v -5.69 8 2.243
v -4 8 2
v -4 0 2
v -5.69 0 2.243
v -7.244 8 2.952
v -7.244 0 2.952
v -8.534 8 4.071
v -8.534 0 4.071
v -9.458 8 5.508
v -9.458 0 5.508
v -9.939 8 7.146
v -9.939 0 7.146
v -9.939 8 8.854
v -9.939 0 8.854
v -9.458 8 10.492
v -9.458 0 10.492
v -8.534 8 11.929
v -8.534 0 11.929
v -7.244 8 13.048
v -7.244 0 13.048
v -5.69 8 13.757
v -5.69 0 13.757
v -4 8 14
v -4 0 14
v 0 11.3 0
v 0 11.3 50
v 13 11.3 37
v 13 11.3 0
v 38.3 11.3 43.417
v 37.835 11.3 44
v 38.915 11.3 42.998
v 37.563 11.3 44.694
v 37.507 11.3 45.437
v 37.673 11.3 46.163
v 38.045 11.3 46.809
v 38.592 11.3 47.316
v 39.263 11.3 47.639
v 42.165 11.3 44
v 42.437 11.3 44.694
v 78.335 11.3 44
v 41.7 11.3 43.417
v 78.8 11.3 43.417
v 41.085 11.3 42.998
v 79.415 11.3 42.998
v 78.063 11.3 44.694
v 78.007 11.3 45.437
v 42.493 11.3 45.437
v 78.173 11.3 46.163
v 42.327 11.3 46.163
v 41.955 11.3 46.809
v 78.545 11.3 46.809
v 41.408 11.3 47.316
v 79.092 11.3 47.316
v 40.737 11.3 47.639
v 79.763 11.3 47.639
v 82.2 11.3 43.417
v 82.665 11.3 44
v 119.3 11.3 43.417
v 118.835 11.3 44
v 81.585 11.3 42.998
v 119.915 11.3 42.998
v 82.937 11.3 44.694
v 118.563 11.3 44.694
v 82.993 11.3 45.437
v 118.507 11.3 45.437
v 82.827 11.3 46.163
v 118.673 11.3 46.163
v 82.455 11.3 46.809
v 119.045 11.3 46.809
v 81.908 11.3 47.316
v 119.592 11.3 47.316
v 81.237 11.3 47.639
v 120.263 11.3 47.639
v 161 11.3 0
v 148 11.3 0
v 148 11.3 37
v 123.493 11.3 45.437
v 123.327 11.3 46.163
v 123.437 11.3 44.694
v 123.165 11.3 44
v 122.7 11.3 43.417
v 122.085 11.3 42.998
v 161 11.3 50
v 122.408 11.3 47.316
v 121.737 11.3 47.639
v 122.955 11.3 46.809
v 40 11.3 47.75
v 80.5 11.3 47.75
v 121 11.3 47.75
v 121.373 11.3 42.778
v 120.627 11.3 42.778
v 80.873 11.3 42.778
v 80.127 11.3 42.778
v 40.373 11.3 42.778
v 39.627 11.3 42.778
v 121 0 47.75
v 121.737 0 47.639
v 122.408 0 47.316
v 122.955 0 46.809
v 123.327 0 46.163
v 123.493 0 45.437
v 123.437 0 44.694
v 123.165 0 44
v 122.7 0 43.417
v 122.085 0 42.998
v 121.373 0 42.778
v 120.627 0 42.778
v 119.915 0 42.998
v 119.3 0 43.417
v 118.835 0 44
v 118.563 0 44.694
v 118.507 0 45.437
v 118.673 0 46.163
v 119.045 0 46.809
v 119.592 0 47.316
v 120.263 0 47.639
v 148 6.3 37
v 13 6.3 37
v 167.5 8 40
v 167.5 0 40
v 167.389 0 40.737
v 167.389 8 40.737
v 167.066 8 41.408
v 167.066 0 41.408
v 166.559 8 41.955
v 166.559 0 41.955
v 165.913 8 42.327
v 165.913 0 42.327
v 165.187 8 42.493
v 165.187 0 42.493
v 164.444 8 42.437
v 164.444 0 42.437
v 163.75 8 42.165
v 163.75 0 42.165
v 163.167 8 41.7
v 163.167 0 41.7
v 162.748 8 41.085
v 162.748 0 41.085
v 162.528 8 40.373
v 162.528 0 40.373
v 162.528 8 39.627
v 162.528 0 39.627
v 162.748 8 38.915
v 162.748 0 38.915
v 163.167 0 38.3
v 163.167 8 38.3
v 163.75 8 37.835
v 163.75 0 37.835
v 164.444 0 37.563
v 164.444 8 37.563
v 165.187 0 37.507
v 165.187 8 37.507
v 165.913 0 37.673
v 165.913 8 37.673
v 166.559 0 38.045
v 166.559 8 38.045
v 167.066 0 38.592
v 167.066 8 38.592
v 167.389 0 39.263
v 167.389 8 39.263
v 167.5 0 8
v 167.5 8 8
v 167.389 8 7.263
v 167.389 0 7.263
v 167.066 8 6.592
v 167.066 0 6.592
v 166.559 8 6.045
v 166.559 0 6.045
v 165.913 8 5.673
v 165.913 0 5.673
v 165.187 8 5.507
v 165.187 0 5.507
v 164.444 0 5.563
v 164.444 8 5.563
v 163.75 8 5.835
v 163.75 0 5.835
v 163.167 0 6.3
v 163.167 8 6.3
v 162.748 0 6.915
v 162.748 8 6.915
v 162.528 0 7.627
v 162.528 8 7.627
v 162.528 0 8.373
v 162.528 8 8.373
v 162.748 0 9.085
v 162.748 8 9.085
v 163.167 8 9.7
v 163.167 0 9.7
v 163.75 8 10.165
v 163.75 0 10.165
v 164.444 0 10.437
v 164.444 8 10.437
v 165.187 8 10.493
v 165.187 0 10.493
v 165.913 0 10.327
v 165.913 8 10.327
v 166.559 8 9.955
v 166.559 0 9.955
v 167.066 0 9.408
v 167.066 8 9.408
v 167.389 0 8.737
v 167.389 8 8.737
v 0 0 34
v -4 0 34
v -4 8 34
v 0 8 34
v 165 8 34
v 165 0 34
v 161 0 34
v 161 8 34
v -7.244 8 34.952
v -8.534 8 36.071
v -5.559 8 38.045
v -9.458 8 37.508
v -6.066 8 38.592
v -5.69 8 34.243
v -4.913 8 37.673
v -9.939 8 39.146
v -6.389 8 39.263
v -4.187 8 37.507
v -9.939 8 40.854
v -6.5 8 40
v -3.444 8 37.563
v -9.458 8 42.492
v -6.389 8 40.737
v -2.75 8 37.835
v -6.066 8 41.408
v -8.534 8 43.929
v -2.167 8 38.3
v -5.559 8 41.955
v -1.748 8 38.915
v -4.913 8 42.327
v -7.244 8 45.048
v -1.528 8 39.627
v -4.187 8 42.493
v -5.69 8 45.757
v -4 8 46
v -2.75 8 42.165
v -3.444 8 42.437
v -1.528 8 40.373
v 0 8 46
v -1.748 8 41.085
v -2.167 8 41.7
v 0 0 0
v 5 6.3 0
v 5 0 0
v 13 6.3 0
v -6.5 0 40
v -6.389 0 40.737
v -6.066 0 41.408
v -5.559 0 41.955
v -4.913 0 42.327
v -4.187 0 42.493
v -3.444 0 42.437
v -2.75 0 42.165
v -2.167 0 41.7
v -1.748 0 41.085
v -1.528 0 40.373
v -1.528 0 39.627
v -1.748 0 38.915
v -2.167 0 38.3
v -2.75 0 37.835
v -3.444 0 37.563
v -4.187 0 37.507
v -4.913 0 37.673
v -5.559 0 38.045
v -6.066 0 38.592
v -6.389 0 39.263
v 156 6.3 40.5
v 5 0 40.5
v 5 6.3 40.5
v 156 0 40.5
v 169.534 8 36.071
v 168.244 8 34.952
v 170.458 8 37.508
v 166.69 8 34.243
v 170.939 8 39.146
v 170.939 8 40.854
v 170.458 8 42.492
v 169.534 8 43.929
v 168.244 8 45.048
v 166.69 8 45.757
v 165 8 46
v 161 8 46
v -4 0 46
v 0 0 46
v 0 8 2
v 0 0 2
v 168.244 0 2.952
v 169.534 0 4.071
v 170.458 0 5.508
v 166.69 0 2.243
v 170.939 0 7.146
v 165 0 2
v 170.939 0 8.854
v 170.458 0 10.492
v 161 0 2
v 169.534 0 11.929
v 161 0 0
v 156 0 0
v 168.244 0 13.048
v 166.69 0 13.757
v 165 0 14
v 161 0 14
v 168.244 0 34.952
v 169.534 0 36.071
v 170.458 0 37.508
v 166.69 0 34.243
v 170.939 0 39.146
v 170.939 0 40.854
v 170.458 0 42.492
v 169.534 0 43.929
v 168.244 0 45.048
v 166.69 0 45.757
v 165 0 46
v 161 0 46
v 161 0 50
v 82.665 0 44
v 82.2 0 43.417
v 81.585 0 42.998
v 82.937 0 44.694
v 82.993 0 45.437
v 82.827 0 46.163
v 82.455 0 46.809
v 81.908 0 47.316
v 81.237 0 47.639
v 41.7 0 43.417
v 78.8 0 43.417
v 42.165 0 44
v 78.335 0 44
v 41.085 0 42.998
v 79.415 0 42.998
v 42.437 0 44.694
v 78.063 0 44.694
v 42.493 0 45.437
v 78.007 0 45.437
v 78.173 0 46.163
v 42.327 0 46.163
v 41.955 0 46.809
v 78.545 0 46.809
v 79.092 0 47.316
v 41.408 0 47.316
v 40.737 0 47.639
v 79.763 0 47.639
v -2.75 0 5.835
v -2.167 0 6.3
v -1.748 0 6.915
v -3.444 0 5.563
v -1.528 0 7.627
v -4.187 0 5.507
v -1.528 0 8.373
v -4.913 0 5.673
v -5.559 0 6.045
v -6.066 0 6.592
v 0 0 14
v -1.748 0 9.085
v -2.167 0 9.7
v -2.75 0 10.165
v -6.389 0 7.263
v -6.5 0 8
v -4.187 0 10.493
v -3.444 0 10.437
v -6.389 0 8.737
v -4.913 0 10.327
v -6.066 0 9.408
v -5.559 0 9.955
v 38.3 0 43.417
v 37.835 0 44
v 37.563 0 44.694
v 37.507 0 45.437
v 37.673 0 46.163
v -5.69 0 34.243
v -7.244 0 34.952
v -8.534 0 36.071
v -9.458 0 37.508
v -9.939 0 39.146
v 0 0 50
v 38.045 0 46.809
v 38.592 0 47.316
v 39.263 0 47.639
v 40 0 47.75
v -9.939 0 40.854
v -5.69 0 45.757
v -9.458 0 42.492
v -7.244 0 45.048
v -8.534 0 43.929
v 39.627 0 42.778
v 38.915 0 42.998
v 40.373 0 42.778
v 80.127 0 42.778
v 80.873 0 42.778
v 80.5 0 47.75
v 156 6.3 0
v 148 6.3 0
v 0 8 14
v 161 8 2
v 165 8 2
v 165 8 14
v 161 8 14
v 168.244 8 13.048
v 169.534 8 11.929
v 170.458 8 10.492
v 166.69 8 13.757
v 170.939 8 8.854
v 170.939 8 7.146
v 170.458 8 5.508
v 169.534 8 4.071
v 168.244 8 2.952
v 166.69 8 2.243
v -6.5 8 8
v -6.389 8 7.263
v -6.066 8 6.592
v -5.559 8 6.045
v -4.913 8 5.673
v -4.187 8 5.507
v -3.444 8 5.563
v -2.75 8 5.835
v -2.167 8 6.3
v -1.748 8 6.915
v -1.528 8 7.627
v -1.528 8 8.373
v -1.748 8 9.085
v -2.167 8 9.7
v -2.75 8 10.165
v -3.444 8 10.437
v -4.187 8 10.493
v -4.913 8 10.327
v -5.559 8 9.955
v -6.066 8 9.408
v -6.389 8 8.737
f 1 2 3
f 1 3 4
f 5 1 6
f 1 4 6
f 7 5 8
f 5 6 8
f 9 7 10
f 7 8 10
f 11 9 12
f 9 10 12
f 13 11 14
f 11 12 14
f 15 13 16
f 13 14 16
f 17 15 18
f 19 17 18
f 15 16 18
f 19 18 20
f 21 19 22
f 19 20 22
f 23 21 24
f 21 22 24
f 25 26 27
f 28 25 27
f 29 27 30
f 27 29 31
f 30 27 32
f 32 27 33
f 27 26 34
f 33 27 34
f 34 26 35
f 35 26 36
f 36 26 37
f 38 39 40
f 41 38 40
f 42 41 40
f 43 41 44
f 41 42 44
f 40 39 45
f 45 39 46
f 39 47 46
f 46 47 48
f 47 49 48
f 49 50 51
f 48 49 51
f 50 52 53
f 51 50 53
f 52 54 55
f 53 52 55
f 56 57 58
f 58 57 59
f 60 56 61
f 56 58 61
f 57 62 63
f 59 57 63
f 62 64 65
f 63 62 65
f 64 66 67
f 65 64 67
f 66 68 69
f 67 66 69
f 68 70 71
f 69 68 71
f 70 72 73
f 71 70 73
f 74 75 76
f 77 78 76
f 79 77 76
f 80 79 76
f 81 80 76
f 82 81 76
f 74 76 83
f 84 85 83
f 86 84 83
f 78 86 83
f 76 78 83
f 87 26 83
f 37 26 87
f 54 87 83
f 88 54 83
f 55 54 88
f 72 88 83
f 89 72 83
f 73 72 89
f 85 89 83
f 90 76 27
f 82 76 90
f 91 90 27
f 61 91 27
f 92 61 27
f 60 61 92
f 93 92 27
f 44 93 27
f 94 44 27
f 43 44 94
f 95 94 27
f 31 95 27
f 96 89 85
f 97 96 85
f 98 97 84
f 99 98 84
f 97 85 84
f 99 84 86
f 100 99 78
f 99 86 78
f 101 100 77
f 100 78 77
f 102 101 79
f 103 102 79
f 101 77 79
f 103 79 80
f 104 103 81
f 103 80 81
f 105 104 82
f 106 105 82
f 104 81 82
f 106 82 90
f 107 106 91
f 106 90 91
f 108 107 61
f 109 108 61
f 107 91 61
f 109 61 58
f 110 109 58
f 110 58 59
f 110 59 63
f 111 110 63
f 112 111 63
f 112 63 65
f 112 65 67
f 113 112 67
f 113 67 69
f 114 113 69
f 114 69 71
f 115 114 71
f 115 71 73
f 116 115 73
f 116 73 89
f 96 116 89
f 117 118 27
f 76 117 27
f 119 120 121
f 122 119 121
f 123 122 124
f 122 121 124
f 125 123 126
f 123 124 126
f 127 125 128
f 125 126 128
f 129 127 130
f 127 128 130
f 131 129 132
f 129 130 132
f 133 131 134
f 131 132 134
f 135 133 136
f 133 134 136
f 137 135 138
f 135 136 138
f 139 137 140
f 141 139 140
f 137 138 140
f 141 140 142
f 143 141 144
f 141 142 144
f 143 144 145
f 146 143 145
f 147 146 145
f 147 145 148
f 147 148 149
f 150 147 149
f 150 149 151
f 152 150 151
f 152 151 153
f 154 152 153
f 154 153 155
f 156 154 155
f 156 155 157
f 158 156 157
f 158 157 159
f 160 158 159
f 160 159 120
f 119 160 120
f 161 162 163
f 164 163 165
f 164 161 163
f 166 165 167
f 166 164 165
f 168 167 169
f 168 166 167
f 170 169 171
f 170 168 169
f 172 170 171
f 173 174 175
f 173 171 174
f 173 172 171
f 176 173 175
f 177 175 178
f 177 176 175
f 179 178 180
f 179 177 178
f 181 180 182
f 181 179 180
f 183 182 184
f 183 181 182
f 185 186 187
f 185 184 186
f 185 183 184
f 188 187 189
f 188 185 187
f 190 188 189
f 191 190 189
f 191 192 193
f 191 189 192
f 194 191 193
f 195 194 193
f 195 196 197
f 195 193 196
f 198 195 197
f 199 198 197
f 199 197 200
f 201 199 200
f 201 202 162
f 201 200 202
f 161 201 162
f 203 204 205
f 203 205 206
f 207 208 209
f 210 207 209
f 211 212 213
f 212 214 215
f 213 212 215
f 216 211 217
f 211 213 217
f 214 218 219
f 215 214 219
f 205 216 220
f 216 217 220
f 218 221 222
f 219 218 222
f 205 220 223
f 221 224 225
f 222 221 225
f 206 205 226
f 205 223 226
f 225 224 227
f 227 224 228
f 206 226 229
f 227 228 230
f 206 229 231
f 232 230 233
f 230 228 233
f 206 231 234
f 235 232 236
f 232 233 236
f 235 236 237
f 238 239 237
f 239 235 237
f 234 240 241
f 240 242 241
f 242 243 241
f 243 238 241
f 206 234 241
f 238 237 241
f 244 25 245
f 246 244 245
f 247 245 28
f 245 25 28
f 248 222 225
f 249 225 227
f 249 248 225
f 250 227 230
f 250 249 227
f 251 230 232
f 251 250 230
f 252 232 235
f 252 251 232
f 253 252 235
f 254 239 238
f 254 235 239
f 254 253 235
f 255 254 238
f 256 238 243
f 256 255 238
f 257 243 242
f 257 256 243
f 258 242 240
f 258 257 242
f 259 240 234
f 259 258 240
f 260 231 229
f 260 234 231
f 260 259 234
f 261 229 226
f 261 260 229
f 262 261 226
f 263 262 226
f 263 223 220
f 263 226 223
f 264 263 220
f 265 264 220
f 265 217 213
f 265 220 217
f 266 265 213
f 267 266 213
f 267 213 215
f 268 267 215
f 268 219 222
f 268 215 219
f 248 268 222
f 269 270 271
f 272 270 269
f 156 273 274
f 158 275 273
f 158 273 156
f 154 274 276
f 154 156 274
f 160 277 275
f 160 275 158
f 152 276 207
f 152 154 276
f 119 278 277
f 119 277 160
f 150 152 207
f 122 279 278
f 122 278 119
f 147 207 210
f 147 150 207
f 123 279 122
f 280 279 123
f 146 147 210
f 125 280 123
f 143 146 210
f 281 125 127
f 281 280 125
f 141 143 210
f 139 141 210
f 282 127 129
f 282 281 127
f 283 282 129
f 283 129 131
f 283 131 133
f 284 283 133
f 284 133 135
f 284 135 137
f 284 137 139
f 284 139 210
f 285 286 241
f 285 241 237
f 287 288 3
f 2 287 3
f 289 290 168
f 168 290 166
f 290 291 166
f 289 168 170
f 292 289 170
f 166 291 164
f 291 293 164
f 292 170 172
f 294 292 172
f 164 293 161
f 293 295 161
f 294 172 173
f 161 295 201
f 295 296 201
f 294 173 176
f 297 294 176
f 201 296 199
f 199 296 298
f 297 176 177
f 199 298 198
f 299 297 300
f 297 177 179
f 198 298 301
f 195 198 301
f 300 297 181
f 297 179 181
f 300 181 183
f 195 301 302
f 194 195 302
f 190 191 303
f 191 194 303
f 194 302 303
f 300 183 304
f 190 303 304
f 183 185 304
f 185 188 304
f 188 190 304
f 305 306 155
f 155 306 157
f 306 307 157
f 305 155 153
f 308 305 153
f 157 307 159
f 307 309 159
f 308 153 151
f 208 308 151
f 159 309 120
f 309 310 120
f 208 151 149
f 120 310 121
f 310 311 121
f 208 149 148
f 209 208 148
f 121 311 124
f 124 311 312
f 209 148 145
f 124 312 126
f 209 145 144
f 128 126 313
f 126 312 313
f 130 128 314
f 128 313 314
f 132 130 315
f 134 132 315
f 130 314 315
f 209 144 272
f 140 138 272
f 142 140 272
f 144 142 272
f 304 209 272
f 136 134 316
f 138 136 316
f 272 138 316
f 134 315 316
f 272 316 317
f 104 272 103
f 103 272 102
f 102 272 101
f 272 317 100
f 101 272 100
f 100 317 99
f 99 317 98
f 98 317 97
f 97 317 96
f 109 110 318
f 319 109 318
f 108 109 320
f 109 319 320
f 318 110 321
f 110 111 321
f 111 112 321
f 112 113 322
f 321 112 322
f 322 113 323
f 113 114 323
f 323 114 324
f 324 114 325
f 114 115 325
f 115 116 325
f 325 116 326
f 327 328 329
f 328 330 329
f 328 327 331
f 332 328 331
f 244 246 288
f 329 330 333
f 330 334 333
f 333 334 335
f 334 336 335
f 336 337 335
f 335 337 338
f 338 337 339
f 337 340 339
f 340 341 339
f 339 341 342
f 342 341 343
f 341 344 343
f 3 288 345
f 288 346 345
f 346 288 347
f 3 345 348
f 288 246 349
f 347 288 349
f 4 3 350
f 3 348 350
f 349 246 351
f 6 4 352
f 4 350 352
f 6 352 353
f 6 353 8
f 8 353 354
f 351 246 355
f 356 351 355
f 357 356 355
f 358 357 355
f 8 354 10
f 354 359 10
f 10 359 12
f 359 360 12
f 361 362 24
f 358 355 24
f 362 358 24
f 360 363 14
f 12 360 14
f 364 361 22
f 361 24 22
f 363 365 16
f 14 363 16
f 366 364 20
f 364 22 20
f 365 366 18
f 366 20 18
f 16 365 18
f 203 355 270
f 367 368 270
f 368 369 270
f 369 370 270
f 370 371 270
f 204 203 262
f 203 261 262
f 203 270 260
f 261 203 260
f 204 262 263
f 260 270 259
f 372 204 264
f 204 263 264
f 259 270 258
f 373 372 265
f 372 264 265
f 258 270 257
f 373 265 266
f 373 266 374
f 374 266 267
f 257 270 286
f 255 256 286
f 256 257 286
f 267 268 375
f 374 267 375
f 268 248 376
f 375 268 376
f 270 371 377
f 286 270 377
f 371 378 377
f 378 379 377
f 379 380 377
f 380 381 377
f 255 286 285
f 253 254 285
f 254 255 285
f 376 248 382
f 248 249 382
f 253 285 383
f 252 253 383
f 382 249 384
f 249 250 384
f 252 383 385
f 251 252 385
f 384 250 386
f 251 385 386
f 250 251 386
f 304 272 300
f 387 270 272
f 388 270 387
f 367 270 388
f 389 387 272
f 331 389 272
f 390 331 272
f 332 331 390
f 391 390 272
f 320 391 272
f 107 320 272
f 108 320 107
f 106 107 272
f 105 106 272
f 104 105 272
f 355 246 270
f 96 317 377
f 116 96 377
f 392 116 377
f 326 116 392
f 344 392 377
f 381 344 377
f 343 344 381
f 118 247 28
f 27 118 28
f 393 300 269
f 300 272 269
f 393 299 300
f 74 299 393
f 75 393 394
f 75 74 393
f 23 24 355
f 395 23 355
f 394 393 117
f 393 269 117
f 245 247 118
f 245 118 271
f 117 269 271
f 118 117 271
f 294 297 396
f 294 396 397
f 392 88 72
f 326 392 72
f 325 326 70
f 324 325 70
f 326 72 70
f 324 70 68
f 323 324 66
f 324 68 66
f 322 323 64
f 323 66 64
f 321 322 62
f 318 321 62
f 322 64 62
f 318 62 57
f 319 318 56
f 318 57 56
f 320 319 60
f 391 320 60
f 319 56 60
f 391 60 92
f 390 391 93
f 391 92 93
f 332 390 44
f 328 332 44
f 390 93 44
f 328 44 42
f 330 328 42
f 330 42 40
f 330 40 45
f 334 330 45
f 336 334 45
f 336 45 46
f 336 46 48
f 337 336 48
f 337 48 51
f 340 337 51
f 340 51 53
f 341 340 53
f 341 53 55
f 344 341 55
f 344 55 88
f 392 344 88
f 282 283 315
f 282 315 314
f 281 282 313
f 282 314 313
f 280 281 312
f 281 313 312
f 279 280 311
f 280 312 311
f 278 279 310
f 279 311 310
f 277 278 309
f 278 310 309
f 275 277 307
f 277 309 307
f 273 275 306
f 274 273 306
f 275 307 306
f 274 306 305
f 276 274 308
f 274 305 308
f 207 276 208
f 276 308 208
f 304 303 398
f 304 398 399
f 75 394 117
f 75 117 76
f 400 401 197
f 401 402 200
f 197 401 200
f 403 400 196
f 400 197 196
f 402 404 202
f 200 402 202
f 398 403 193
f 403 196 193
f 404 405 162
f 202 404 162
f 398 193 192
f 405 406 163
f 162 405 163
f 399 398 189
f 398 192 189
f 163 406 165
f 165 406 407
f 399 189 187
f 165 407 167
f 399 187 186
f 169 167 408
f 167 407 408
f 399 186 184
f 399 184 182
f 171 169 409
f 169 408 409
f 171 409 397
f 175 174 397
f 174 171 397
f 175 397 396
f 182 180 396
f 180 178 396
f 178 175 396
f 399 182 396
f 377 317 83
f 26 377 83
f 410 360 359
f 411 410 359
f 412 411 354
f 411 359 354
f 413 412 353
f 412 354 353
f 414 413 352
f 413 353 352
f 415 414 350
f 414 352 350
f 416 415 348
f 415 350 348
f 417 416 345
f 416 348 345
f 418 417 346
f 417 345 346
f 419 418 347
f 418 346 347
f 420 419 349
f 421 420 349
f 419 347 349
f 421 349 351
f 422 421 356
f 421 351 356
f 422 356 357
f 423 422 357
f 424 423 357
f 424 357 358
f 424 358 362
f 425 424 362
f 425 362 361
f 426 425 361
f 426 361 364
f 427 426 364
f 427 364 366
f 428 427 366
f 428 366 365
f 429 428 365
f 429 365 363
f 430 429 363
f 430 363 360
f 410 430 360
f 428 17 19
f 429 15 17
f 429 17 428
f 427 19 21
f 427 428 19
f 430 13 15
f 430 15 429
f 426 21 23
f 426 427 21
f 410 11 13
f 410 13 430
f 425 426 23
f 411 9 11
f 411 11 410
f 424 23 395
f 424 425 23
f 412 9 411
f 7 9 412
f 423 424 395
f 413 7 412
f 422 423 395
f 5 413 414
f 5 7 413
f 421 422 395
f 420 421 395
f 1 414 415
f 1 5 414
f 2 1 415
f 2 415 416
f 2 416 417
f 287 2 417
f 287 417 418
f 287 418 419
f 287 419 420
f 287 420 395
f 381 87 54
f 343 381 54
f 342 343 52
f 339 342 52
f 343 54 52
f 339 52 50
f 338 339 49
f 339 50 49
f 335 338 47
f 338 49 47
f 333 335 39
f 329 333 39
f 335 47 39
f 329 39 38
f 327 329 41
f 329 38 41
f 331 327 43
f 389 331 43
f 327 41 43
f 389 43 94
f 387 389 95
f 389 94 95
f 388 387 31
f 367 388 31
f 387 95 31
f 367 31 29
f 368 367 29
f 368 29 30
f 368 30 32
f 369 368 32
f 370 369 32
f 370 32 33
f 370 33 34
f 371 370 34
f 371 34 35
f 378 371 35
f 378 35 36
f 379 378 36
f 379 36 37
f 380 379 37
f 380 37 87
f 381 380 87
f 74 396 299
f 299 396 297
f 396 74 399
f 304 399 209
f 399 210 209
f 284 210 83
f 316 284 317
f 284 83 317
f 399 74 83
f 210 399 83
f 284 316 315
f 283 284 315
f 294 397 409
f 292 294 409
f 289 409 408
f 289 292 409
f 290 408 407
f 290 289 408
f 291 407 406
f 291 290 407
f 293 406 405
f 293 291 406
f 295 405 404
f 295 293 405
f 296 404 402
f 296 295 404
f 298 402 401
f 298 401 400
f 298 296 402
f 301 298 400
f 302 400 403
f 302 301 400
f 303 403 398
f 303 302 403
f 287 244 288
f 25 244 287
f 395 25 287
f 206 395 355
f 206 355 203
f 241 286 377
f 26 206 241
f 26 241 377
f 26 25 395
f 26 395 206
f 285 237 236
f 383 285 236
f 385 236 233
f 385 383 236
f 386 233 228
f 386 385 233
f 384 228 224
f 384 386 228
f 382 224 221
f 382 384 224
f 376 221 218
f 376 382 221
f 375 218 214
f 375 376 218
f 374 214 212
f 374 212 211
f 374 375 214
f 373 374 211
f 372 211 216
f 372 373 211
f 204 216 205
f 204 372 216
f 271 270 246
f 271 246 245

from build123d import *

# Parameters (mm, degrees)
CROQUIS4_W                = 13
CROQUIS4_H                = 11.3
SALIENTE_EXTRUIR1_DEPTH   = 161
CROQUIS5_W                = 151
CROQUIS5_H                = 3.5
CORTAR_EXTRUIR1_DEPTH     = 6.3
SALIENTE_EXTRUIR3_DEPTH   = 8
CROQUIS9_R                = 2.5
CORTAR_EXTRUIR3_DEPTH     = 179.518038304
SIMETR_A8_COPY_1_DEPTH    = 8
SIMETR_A8_COPY_2_SKETCH_R = 2.5
SIMETR_A8_COPY_2_DEPTH    = 179.518038304
CROQUIS10_R               = 2.5
CORTAR_EXTRUIR4_DEPTH     = 179.518038304
MATRIZL1_COUNT            = 3
MATRIZL1_PITCH            = 40.5


with BuildPart() as part:
    # Barrer1: sweep along a path in Croquis3
    with BuildLine(Plane(origin=(0, 0, 0), x_dir=(1, 0, 0), z_dir=(0, 1, 0))) as barrer1_path:
        Line((0, 0), (0, -37))
    # Croquis1 → Barrer1 (sweep)
    with BuildSketch(Plane.XY):
        Polygon((0, 0), (0, 11.3), (13, 11.3), (13, 6.3), (5, 6.3), (5, 0), align=None)
    barrer1 = sweep(path=barrer1_path.line)

    # Croquis4 → Saliente-Extruir1 (add)
    with BuildSketch(Plane.ZY):
        with Locations((43.5, 5.65)):
            Rectangle(CROQUIS4_W, CROQUIS4_H)
    extrude(amount=-SALIENTE_EXTRUIR1_DEPTH)

    # Simetría5: Barrer1 across plane
    add(barrer1.mirror(Plane.ZY.offset(-80.5)))

    # Croquis5 → Cortar-Extruir1 (cut)
    with BuildSketch(Plane.XZ):
        with Locations((80.5, 38.75)):
            Rectangle(CROQUIS5_W, CROQUIS5_H)
    extrude(amount=-CORTAR_EXTRUIR1_DEPTH, mode=Mode.SUBTRACT)

    # Croquis8 → Saliente-Extruir3 (add)
    with BuildSketch(Plane.XZ):
        with BuildLine():
            Line((161, 46), (165, 46))
            ThreePointArc((165, 46), (171, 40), (165, 34))
            Line((165, 34), (161, 34))
            Line((161, 34), (161, 46))
        make_face()
    saliente_extruir3 = extrude(amount=-SALIENTE_EXTRUIR3_DEPTH)

    # Croquis9 → Cortar-Extruir3 (cut, through all)
    with BuildSketch(Plane.XZ):
        with Locations((165, 40)):
            Circle(CROQUIS9_R)
    cortar_extruir3 = extrude(amount=-CORTAR_EXTRUIR3_DEPTH, mode=Mode.SUBTRACT)

    # Simetría7: Saliente-Extruir3, Cortar-Extruir3 across plane
    add(saliente_extruir3.mirror(Plane(origin=(0, 0, 24), x_dir=(1, 0, 0), z_dir=(0, 0, -1))))
    add(cortar_extruir3.mirror(Plane(origin=(0, 0, 24), x_dir=(1, 0, 0), z_dir=(0, 0, -1))), mode=Mode.SUBTRACT)

    # Simetría8: Saliente-Extruir3, Cortar-Extruir3 across plane
    add(saliente_extruir3.mirror(Plane.ZY.offset(-80.5)))
    add(cortar_extruir3.mirror(Plane.ZY.offset(-80.5)), mode=Mode.SUBTRACT)

    # Simetría8 copy 1 sketch → Simetría8 copy 1 (add)
    with BuildSketch(Plane(origin=(161, 0, 48), x_dir=(-1, 0, 0), z_dir=(0, -1, 0))):
        with BuildLine():
            Line((161, 46), (165, 46))
            ThreePointArc((165, 46), (171, 40), (165, 34))
            Line((165, 34), (161, 34))
            Line((161, 34), (161, 46))
        make_face()
    extrude(amount=-SIMETR_A8_COPY_1_DEPTH)

    # Simetría8 copy 2 sketch → Simetría8 copy 2 (cut, through all)
    with BuildSketch(Plane(origin=(161, 0, 48), x_dir=(-1, 0, 0), z_dir=(0, -1, 0))):
        with Locations((165, 40)):
            Circle(SIMETR_A8_COPY_2_SKETCH_R)
    extrude(amount=-SIMETR_A8_COPY_2_DEPTH, mode=Mode.SUBTRACT)

    # Croquis10 → Cortar-Extruir4 (cut, through all)
    with BuildSketch(Plane(origin=(0, 11.3, 0), x_dir=(1, 0, 0), z_dir=(0, 1, 0))):
        with Locations(Location((121, -45.25, 0), (0, 0, 270))):
            Circle(CROQUIS10_R)
    cortar_extruir4 = extrude(amount=-CORTAR_EXTRUIR4_DEPTH, mode=Mode.SUBTRACT)

    # MatrizL1: Cortar-Extruir4 ×3
    with Locations(*[(-i * MATRIZL1_PITCH, 0, 0) for i in range(1, MATRIZL1_COUNT)]):
        add(cortar_extruir4, mode=Mode.SUBTRACT)


solid = part.part
